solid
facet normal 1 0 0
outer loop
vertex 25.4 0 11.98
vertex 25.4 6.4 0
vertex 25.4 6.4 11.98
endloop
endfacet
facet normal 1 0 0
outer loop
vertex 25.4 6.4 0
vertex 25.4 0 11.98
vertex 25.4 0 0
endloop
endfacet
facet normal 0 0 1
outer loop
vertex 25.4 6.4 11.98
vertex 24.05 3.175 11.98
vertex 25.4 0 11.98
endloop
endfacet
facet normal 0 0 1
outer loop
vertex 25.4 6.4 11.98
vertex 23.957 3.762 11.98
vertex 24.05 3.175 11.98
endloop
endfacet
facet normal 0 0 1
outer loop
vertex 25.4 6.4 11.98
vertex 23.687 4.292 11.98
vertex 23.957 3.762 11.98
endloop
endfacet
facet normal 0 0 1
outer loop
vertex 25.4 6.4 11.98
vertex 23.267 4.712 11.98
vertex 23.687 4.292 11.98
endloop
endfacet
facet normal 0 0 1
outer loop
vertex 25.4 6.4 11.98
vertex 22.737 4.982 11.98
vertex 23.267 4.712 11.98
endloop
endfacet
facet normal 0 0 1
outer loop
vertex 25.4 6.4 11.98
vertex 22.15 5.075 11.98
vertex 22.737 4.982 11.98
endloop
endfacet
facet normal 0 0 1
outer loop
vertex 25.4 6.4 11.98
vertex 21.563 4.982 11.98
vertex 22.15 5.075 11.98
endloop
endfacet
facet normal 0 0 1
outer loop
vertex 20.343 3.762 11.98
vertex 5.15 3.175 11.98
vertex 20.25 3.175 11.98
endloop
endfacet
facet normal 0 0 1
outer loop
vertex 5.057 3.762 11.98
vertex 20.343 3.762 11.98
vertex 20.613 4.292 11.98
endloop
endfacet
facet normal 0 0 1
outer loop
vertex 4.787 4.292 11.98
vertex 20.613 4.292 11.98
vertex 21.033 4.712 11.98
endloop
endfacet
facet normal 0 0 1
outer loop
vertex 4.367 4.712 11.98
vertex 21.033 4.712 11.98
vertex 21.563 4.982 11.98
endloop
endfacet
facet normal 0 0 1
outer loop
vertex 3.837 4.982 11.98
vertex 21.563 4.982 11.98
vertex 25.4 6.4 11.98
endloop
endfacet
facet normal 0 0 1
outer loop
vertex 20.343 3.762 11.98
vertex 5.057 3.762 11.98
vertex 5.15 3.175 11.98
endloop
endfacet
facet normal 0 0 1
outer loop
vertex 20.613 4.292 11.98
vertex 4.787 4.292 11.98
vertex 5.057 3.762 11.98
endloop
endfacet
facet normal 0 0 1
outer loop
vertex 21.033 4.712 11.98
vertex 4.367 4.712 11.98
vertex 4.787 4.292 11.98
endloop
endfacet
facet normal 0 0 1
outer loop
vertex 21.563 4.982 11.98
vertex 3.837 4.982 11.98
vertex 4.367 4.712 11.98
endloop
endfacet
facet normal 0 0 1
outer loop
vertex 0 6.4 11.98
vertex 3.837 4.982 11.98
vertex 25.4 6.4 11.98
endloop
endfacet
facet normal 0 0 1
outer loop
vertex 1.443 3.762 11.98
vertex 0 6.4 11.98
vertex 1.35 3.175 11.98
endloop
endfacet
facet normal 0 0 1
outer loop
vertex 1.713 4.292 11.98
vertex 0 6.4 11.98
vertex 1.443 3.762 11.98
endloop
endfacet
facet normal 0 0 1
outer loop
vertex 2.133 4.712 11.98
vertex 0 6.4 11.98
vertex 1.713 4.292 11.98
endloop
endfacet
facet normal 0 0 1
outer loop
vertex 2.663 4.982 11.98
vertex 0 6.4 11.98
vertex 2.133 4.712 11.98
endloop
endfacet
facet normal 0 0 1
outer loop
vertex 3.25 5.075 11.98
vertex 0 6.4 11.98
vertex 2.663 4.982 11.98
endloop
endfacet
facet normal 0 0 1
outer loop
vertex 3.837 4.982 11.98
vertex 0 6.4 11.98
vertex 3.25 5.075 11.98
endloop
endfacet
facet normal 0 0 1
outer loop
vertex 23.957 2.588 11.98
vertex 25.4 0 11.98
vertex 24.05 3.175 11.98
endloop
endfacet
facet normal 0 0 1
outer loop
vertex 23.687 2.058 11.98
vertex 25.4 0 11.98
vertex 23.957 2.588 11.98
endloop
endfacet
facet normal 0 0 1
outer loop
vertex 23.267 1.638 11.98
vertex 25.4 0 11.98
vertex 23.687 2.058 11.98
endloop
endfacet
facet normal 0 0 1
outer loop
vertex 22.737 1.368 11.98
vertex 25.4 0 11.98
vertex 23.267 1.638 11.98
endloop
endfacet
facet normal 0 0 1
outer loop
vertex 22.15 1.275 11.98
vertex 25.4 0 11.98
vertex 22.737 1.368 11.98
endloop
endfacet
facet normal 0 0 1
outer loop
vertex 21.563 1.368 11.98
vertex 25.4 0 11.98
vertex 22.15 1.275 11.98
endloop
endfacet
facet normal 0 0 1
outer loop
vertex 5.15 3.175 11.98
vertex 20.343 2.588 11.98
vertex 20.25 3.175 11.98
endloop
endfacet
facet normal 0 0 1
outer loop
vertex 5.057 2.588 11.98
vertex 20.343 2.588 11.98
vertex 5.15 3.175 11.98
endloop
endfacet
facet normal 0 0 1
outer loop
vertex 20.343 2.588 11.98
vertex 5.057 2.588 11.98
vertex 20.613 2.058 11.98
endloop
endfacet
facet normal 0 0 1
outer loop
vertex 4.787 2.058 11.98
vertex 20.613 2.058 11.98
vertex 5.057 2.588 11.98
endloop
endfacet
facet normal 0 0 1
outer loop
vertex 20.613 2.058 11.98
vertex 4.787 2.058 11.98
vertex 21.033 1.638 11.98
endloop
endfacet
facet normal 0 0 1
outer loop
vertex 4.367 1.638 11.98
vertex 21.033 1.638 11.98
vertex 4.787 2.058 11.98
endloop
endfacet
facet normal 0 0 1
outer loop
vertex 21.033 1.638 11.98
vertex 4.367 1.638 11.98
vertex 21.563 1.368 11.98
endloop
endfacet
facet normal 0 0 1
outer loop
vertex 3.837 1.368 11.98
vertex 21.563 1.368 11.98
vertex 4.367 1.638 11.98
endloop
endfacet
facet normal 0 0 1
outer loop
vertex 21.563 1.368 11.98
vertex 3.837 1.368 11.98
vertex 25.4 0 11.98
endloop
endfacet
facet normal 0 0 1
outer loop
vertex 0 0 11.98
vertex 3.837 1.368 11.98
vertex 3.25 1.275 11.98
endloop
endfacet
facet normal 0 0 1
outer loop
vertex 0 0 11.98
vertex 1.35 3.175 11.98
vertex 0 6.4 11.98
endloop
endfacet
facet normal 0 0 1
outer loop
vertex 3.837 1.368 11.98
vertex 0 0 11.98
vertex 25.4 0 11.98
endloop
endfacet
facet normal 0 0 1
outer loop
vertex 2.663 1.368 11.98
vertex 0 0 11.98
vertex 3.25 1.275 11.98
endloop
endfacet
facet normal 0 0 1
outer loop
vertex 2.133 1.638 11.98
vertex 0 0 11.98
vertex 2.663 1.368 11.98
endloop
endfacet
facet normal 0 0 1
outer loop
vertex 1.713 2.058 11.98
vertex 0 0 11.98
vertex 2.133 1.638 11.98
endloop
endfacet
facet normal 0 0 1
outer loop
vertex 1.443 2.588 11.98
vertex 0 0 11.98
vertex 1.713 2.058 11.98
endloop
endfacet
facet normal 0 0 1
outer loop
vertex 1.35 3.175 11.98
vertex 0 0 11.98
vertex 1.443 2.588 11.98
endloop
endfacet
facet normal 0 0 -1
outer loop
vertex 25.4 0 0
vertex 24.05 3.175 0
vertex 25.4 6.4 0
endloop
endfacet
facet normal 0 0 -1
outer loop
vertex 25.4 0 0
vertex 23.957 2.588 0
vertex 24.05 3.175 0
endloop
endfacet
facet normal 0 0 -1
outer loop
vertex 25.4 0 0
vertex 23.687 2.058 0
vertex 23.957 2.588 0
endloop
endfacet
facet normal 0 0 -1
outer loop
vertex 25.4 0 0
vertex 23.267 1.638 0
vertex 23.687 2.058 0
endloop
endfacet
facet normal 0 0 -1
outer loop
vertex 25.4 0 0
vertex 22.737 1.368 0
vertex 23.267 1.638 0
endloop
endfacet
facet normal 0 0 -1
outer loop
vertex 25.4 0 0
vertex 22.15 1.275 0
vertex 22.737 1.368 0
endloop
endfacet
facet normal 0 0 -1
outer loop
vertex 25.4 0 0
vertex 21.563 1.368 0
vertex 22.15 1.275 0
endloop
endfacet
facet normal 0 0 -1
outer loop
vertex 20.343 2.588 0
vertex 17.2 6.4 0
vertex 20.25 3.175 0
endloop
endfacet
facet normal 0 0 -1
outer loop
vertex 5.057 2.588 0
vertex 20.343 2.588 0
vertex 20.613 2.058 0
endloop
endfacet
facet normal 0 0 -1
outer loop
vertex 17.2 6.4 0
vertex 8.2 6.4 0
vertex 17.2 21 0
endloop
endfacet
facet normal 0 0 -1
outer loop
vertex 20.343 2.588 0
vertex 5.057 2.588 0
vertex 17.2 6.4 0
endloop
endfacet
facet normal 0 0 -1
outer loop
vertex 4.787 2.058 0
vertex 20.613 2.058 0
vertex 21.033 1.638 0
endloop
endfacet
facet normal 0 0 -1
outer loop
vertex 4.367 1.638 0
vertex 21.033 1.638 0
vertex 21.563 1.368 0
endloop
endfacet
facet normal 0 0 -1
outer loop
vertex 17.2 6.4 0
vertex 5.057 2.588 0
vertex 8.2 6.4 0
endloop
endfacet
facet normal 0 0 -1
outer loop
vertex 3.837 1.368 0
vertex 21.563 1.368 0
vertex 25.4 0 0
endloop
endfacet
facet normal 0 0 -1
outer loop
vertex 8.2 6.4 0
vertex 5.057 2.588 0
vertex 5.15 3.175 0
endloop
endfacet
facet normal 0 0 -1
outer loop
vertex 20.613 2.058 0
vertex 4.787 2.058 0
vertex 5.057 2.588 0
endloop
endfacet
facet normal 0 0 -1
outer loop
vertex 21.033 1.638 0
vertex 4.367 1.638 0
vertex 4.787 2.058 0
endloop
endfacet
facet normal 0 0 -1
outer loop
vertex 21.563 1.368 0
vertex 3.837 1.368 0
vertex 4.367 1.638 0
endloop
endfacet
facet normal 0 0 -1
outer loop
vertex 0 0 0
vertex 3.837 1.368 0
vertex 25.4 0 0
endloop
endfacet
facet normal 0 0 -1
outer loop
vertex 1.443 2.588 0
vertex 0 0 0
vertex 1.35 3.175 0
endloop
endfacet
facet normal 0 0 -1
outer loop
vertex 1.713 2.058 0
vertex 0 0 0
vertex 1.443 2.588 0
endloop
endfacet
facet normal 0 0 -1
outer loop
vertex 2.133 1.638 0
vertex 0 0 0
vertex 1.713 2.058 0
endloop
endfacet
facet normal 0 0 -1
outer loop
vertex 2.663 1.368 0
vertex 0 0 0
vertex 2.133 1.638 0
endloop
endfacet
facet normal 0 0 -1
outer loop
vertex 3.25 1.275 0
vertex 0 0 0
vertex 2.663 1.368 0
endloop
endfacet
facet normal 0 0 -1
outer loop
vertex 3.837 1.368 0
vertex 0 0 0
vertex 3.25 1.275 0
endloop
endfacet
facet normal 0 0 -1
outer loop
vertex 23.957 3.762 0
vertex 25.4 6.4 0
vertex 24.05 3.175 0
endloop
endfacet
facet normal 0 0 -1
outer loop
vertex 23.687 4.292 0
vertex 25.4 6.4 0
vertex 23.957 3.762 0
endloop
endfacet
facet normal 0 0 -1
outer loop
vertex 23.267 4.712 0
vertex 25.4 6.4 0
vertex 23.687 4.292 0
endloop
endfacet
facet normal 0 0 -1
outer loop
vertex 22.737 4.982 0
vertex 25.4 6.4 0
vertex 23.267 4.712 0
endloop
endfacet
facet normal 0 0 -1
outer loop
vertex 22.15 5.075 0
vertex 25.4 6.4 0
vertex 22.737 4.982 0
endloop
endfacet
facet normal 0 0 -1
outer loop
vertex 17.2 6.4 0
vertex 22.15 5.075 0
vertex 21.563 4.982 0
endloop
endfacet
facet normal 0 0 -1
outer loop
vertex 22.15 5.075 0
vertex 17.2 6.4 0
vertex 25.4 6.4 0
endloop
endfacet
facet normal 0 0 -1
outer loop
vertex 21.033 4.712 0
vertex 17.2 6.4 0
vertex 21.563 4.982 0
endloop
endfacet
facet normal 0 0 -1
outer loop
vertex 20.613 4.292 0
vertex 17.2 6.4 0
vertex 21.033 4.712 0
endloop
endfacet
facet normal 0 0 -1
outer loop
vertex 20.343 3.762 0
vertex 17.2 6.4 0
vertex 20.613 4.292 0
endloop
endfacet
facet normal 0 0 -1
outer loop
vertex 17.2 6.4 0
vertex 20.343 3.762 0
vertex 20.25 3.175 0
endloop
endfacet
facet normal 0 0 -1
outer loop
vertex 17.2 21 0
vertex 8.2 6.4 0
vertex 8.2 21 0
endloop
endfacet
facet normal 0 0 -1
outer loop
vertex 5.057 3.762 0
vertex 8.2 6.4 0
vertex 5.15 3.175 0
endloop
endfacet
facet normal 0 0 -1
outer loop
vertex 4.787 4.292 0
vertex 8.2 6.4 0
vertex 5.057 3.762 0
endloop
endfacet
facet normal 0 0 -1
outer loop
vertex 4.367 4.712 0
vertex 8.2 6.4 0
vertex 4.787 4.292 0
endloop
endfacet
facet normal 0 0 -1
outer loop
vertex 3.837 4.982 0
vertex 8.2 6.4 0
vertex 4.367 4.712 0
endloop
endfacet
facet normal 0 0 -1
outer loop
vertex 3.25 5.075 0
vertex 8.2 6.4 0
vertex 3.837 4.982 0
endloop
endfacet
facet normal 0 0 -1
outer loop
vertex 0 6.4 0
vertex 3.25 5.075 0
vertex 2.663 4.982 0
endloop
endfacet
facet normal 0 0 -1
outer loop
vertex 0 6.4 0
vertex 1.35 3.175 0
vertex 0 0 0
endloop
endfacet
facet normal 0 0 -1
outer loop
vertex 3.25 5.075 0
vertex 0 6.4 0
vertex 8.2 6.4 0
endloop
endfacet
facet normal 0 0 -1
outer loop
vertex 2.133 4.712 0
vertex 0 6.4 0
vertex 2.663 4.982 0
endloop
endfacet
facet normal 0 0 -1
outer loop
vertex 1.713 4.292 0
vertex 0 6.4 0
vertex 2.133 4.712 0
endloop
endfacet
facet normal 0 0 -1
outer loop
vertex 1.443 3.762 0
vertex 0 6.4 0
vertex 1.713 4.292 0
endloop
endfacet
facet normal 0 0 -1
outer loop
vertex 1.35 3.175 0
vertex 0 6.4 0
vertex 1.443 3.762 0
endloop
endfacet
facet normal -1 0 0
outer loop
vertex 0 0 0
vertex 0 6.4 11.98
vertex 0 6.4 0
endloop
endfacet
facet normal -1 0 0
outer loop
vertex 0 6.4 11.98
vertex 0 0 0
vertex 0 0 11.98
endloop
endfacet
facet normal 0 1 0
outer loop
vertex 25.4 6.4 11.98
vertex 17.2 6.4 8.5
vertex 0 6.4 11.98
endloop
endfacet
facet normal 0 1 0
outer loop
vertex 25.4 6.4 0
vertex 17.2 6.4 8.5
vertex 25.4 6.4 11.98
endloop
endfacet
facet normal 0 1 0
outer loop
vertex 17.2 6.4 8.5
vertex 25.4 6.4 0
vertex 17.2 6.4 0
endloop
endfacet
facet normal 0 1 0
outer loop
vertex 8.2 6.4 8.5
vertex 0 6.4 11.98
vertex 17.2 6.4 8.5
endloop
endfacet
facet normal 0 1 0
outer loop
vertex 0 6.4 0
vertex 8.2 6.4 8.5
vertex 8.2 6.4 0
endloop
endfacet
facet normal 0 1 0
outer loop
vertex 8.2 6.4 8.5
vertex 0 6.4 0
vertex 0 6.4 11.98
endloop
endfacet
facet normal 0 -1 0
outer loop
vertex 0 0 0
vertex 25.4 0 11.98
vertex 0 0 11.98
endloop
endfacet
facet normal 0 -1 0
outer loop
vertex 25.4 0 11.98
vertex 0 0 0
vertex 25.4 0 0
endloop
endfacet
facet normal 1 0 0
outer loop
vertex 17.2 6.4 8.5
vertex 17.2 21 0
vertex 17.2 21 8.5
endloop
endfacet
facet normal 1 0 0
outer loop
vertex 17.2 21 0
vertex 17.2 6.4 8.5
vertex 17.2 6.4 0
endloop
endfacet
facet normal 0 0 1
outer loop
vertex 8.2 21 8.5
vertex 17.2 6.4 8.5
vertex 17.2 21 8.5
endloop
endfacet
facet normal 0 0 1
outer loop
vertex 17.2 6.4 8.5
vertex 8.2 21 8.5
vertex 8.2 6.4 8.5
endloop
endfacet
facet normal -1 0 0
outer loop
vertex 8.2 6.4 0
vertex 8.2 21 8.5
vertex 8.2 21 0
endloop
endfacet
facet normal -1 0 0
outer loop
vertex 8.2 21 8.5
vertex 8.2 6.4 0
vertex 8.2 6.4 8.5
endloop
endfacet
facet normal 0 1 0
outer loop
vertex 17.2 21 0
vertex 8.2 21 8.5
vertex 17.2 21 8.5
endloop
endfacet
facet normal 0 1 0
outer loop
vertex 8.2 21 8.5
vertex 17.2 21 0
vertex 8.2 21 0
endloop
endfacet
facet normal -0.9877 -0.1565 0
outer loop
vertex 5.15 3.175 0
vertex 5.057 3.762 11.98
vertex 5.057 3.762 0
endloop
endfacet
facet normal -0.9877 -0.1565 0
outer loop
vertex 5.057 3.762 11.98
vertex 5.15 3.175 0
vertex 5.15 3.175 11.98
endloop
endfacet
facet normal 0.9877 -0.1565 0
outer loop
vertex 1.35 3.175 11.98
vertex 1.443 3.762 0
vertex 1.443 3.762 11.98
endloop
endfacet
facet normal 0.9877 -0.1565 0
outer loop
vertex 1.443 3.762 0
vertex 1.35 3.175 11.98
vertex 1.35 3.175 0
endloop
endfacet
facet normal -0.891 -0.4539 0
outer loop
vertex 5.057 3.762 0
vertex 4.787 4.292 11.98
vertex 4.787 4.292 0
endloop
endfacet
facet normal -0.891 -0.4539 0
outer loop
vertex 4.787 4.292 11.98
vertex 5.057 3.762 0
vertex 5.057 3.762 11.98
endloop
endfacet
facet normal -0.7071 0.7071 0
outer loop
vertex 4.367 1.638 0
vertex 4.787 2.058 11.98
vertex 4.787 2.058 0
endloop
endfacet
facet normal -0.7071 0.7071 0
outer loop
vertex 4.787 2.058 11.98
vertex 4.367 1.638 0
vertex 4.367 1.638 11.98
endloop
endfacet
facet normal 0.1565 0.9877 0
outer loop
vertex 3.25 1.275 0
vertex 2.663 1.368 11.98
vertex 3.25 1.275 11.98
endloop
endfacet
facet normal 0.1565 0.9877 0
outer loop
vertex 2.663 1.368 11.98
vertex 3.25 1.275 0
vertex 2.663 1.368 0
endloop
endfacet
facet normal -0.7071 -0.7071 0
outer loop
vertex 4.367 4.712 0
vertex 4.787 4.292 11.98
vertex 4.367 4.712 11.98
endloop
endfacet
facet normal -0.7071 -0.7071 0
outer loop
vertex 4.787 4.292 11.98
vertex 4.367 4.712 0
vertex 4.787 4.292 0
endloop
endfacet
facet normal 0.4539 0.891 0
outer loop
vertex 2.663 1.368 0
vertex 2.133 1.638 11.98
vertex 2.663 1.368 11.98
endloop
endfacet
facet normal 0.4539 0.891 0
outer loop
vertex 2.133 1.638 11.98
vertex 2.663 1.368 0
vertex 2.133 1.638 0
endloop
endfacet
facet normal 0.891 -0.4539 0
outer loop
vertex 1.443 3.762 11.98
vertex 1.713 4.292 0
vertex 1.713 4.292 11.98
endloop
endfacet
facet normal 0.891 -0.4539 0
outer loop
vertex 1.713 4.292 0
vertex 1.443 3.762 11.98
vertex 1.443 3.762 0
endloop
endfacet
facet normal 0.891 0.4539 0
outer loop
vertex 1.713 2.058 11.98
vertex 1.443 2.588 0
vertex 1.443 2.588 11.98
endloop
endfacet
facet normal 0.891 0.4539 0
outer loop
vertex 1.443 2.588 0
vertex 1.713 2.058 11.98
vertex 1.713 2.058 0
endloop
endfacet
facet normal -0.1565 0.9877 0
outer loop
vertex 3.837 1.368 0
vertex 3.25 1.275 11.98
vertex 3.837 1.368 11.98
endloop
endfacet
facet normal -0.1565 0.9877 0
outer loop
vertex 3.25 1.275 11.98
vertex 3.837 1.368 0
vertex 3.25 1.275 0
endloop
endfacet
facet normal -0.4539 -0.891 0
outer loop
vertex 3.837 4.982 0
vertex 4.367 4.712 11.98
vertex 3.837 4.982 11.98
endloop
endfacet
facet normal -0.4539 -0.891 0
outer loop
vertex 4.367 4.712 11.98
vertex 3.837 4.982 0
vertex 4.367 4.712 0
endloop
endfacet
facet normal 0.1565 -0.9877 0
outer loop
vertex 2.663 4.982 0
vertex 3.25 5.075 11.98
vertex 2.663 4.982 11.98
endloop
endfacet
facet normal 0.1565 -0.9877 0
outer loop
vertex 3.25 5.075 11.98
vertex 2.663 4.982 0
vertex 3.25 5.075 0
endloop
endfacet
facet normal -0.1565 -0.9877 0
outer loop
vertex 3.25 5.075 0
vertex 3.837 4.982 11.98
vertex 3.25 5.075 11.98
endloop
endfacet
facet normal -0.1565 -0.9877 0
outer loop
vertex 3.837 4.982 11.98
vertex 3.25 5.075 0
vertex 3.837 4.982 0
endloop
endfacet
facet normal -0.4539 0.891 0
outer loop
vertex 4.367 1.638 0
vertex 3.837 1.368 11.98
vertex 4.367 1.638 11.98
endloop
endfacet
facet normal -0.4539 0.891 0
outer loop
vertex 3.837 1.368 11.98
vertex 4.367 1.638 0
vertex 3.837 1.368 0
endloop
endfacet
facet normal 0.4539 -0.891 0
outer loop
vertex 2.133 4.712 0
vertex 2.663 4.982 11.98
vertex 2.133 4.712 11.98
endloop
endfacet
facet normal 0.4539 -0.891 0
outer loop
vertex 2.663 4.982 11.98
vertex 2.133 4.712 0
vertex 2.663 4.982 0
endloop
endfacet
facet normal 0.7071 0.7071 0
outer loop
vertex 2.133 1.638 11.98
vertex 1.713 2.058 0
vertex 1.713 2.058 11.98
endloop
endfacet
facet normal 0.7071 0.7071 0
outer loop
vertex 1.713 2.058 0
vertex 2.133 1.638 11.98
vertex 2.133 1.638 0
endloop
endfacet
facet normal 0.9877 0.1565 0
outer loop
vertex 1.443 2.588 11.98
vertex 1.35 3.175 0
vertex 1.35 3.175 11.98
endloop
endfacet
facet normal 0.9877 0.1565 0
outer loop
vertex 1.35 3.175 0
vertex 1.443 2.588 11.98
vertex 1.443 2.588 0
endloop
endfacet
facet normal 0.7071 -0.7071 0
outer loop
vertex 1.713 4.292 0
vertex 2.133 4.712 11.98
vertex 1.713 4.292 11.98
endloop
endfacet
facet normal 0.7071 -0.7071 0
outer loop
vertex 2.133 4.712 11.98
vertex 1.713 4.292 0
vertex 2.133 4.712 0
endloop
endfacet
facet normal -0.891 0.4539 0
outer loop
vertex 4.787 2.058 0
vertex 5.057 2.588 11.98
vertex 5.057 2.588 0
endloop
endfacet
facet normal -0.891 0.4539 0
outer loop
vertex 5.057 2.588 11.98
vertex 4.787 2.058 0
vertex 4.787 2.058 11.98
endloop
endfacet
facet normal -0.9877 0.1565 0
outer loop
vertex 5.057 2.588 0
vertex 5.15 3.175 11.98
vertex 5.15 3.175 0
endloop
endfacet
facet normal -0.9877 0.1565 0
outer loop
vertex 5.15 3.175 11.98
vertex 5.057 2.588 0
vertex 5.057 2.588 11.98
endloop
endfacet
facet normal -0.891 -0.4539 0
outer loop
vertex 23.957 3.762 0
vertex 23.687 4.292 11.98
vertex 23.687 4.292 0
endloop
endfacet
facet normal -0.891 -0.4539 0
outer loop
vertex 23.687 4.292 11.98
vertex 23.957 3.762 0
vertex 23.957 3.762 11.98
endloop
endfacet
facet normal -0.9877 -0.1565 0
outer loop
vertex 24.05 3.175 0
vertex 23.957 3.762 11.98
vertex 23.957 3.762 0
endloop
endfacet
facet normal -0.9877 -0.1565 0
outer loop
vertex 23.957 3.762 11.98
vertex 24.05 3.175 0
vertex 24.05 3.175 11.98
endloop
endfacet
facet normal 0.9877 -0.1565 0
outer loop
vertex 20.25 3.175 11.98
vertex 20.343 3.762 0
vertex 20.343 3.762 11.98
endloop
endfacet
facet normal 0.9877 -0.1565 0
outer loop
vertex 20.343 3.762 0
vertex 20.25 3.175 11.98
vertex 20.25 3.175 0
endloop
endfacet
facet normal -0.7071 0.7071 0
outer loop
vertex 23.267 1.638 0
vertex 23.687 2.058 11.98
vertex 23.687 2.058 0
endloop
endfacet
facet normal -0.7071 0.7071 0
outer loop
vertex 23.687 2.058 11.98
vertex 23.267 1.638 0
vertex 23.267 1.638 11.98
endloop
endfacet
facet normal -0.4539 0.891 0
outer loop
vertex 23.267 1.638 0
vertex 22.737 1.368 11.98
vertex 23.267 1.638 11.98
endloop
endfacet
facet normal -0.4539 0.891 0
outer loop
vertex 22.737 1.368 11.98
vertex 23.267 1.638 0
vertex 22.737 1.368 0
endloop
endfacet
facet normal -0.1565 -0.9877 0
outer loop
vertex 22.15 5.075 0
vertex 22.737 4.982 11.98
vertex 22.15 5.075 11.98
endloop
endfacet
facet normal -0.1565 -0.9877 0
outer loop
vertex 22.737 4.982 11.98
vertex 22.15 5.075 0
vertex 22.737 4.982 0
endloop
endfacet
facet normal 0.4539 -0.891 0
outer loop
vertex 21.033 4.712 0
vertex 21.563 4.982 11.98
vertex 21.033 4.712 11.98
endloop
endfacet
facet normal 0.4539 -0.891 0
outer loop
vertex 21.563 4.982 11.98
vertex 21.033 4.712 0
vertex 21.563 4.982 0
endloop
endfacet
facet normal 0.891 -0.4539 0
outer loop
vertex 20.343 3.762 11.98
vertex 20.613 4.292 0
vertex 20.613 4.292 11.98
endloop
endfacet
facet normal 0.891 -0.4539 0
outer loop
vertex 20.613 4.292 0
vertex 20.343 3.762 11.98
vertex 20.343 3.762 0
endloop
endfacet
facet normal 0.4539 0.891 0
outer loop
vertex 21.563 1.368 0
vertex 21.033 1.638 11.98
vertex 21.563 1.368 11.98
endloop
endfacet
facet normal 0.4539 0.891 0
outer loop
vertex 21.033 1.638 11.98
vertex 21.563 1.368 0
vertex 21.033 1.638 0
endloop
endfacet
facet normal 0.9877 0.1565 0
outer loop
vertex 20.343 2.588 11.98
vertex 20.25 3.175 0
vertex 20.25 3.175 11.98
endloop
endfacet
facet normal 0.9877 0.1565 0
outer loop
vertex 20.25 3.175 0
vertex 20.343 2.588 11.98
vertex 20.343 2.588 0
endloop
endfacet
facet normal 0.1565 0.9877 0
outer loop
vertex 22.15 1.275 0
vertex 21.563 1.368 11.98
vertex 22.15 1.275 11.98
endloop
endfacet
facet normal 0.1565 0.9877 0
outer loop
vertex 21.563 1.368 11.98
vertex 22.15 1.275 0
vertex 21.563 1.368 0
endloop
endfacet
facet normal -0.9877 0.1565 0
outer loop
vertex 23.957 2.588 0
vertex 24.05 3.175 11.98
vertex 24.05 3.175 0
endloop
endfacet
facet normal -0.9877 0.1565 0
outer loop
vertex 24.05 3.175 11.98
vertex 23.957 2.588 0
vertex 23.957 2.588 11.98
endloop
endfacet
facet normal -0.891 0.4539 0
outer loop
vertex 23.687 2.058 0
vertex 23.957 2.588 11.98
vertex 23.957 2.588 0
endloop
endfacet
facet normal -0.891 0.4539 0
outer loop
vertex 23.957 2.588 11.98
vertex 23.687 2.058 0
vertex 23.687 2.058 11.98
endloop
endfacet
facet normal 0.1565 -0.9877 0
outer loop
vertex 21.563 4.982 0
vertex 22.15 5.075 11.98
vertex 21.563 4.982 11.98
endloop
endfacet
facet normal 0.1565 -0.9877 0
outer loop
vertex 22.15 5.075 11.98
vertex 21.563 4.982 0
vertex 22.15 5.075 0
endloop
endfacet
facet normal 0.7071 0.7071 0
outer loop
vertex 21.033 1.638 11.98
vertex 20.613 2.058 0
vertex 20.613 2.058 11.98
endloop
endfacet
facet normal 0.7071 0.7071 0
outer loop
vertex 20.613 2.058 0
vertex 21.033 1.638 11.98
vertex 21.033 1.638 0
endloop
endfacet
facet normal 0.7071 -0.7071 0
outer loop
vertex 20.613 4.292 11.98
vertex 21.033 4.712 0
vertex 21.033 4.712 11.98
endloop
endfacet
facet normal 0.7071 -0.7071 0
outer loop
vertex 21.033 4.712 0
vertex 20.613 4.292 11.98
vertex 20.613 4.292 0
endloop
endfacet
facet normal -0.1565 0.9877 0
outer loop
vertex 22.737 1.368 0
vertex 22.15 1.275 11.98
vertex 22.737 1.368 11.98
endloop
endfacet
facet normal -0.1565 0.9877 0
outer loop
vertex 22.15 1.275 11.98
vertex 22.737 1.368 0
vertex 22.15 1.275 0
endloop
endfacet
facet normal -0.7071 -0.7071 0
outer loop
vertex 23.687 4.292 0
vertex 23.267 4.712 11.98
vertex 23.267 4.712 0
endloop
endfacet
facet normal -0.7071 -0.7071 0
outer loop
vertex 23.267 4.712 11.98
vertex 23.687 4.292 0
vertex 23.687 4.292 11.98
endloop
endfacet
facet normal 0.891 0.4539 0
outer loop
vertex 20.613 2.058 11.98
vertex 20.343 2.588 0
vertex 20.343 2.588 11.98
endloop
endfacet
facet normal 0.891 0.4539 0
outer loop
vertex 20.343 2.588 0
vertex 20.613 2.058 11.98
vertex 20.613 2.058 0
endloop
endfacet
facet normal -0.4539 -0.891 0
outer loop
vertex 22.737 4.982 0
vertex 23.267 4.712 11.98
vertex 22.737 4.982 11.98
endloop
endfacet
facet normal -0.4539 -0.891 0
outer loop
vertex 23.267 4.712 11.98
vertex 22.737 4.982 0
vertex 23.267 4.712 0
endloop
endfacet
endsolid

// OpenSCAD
// sensorBack: back plate to hold sensor to face

// Definitions (all lengths are in millimeters)
//locations of the two bolt centers on x-axis
xc=12.7;    // x-center (axis of symmetry)
b1=xc-9.45; // center of first bolt hole
b2=xc+9.45; // center of second bolt hole
bh=1.9;     // radius of 4-40 bolt hole
xheight=xc*2;  // height of object in x

//No modules are used--we're just defining a 3D shape
difference() { //union() with everything else subtracted

  union() {
    cube([xheight,6.4,11.98]);
    translate([xc-9/2,0,0]) cube([9,21,8.5]);
  }

  //These holes are subtracted from the union above
  translate([b1,3.175,0]) cylinder(r=bh, h=13, $fn=20);
  translate([b2,3.175,0]) cylinder(r=bh, h=13, $fn=20);
}
